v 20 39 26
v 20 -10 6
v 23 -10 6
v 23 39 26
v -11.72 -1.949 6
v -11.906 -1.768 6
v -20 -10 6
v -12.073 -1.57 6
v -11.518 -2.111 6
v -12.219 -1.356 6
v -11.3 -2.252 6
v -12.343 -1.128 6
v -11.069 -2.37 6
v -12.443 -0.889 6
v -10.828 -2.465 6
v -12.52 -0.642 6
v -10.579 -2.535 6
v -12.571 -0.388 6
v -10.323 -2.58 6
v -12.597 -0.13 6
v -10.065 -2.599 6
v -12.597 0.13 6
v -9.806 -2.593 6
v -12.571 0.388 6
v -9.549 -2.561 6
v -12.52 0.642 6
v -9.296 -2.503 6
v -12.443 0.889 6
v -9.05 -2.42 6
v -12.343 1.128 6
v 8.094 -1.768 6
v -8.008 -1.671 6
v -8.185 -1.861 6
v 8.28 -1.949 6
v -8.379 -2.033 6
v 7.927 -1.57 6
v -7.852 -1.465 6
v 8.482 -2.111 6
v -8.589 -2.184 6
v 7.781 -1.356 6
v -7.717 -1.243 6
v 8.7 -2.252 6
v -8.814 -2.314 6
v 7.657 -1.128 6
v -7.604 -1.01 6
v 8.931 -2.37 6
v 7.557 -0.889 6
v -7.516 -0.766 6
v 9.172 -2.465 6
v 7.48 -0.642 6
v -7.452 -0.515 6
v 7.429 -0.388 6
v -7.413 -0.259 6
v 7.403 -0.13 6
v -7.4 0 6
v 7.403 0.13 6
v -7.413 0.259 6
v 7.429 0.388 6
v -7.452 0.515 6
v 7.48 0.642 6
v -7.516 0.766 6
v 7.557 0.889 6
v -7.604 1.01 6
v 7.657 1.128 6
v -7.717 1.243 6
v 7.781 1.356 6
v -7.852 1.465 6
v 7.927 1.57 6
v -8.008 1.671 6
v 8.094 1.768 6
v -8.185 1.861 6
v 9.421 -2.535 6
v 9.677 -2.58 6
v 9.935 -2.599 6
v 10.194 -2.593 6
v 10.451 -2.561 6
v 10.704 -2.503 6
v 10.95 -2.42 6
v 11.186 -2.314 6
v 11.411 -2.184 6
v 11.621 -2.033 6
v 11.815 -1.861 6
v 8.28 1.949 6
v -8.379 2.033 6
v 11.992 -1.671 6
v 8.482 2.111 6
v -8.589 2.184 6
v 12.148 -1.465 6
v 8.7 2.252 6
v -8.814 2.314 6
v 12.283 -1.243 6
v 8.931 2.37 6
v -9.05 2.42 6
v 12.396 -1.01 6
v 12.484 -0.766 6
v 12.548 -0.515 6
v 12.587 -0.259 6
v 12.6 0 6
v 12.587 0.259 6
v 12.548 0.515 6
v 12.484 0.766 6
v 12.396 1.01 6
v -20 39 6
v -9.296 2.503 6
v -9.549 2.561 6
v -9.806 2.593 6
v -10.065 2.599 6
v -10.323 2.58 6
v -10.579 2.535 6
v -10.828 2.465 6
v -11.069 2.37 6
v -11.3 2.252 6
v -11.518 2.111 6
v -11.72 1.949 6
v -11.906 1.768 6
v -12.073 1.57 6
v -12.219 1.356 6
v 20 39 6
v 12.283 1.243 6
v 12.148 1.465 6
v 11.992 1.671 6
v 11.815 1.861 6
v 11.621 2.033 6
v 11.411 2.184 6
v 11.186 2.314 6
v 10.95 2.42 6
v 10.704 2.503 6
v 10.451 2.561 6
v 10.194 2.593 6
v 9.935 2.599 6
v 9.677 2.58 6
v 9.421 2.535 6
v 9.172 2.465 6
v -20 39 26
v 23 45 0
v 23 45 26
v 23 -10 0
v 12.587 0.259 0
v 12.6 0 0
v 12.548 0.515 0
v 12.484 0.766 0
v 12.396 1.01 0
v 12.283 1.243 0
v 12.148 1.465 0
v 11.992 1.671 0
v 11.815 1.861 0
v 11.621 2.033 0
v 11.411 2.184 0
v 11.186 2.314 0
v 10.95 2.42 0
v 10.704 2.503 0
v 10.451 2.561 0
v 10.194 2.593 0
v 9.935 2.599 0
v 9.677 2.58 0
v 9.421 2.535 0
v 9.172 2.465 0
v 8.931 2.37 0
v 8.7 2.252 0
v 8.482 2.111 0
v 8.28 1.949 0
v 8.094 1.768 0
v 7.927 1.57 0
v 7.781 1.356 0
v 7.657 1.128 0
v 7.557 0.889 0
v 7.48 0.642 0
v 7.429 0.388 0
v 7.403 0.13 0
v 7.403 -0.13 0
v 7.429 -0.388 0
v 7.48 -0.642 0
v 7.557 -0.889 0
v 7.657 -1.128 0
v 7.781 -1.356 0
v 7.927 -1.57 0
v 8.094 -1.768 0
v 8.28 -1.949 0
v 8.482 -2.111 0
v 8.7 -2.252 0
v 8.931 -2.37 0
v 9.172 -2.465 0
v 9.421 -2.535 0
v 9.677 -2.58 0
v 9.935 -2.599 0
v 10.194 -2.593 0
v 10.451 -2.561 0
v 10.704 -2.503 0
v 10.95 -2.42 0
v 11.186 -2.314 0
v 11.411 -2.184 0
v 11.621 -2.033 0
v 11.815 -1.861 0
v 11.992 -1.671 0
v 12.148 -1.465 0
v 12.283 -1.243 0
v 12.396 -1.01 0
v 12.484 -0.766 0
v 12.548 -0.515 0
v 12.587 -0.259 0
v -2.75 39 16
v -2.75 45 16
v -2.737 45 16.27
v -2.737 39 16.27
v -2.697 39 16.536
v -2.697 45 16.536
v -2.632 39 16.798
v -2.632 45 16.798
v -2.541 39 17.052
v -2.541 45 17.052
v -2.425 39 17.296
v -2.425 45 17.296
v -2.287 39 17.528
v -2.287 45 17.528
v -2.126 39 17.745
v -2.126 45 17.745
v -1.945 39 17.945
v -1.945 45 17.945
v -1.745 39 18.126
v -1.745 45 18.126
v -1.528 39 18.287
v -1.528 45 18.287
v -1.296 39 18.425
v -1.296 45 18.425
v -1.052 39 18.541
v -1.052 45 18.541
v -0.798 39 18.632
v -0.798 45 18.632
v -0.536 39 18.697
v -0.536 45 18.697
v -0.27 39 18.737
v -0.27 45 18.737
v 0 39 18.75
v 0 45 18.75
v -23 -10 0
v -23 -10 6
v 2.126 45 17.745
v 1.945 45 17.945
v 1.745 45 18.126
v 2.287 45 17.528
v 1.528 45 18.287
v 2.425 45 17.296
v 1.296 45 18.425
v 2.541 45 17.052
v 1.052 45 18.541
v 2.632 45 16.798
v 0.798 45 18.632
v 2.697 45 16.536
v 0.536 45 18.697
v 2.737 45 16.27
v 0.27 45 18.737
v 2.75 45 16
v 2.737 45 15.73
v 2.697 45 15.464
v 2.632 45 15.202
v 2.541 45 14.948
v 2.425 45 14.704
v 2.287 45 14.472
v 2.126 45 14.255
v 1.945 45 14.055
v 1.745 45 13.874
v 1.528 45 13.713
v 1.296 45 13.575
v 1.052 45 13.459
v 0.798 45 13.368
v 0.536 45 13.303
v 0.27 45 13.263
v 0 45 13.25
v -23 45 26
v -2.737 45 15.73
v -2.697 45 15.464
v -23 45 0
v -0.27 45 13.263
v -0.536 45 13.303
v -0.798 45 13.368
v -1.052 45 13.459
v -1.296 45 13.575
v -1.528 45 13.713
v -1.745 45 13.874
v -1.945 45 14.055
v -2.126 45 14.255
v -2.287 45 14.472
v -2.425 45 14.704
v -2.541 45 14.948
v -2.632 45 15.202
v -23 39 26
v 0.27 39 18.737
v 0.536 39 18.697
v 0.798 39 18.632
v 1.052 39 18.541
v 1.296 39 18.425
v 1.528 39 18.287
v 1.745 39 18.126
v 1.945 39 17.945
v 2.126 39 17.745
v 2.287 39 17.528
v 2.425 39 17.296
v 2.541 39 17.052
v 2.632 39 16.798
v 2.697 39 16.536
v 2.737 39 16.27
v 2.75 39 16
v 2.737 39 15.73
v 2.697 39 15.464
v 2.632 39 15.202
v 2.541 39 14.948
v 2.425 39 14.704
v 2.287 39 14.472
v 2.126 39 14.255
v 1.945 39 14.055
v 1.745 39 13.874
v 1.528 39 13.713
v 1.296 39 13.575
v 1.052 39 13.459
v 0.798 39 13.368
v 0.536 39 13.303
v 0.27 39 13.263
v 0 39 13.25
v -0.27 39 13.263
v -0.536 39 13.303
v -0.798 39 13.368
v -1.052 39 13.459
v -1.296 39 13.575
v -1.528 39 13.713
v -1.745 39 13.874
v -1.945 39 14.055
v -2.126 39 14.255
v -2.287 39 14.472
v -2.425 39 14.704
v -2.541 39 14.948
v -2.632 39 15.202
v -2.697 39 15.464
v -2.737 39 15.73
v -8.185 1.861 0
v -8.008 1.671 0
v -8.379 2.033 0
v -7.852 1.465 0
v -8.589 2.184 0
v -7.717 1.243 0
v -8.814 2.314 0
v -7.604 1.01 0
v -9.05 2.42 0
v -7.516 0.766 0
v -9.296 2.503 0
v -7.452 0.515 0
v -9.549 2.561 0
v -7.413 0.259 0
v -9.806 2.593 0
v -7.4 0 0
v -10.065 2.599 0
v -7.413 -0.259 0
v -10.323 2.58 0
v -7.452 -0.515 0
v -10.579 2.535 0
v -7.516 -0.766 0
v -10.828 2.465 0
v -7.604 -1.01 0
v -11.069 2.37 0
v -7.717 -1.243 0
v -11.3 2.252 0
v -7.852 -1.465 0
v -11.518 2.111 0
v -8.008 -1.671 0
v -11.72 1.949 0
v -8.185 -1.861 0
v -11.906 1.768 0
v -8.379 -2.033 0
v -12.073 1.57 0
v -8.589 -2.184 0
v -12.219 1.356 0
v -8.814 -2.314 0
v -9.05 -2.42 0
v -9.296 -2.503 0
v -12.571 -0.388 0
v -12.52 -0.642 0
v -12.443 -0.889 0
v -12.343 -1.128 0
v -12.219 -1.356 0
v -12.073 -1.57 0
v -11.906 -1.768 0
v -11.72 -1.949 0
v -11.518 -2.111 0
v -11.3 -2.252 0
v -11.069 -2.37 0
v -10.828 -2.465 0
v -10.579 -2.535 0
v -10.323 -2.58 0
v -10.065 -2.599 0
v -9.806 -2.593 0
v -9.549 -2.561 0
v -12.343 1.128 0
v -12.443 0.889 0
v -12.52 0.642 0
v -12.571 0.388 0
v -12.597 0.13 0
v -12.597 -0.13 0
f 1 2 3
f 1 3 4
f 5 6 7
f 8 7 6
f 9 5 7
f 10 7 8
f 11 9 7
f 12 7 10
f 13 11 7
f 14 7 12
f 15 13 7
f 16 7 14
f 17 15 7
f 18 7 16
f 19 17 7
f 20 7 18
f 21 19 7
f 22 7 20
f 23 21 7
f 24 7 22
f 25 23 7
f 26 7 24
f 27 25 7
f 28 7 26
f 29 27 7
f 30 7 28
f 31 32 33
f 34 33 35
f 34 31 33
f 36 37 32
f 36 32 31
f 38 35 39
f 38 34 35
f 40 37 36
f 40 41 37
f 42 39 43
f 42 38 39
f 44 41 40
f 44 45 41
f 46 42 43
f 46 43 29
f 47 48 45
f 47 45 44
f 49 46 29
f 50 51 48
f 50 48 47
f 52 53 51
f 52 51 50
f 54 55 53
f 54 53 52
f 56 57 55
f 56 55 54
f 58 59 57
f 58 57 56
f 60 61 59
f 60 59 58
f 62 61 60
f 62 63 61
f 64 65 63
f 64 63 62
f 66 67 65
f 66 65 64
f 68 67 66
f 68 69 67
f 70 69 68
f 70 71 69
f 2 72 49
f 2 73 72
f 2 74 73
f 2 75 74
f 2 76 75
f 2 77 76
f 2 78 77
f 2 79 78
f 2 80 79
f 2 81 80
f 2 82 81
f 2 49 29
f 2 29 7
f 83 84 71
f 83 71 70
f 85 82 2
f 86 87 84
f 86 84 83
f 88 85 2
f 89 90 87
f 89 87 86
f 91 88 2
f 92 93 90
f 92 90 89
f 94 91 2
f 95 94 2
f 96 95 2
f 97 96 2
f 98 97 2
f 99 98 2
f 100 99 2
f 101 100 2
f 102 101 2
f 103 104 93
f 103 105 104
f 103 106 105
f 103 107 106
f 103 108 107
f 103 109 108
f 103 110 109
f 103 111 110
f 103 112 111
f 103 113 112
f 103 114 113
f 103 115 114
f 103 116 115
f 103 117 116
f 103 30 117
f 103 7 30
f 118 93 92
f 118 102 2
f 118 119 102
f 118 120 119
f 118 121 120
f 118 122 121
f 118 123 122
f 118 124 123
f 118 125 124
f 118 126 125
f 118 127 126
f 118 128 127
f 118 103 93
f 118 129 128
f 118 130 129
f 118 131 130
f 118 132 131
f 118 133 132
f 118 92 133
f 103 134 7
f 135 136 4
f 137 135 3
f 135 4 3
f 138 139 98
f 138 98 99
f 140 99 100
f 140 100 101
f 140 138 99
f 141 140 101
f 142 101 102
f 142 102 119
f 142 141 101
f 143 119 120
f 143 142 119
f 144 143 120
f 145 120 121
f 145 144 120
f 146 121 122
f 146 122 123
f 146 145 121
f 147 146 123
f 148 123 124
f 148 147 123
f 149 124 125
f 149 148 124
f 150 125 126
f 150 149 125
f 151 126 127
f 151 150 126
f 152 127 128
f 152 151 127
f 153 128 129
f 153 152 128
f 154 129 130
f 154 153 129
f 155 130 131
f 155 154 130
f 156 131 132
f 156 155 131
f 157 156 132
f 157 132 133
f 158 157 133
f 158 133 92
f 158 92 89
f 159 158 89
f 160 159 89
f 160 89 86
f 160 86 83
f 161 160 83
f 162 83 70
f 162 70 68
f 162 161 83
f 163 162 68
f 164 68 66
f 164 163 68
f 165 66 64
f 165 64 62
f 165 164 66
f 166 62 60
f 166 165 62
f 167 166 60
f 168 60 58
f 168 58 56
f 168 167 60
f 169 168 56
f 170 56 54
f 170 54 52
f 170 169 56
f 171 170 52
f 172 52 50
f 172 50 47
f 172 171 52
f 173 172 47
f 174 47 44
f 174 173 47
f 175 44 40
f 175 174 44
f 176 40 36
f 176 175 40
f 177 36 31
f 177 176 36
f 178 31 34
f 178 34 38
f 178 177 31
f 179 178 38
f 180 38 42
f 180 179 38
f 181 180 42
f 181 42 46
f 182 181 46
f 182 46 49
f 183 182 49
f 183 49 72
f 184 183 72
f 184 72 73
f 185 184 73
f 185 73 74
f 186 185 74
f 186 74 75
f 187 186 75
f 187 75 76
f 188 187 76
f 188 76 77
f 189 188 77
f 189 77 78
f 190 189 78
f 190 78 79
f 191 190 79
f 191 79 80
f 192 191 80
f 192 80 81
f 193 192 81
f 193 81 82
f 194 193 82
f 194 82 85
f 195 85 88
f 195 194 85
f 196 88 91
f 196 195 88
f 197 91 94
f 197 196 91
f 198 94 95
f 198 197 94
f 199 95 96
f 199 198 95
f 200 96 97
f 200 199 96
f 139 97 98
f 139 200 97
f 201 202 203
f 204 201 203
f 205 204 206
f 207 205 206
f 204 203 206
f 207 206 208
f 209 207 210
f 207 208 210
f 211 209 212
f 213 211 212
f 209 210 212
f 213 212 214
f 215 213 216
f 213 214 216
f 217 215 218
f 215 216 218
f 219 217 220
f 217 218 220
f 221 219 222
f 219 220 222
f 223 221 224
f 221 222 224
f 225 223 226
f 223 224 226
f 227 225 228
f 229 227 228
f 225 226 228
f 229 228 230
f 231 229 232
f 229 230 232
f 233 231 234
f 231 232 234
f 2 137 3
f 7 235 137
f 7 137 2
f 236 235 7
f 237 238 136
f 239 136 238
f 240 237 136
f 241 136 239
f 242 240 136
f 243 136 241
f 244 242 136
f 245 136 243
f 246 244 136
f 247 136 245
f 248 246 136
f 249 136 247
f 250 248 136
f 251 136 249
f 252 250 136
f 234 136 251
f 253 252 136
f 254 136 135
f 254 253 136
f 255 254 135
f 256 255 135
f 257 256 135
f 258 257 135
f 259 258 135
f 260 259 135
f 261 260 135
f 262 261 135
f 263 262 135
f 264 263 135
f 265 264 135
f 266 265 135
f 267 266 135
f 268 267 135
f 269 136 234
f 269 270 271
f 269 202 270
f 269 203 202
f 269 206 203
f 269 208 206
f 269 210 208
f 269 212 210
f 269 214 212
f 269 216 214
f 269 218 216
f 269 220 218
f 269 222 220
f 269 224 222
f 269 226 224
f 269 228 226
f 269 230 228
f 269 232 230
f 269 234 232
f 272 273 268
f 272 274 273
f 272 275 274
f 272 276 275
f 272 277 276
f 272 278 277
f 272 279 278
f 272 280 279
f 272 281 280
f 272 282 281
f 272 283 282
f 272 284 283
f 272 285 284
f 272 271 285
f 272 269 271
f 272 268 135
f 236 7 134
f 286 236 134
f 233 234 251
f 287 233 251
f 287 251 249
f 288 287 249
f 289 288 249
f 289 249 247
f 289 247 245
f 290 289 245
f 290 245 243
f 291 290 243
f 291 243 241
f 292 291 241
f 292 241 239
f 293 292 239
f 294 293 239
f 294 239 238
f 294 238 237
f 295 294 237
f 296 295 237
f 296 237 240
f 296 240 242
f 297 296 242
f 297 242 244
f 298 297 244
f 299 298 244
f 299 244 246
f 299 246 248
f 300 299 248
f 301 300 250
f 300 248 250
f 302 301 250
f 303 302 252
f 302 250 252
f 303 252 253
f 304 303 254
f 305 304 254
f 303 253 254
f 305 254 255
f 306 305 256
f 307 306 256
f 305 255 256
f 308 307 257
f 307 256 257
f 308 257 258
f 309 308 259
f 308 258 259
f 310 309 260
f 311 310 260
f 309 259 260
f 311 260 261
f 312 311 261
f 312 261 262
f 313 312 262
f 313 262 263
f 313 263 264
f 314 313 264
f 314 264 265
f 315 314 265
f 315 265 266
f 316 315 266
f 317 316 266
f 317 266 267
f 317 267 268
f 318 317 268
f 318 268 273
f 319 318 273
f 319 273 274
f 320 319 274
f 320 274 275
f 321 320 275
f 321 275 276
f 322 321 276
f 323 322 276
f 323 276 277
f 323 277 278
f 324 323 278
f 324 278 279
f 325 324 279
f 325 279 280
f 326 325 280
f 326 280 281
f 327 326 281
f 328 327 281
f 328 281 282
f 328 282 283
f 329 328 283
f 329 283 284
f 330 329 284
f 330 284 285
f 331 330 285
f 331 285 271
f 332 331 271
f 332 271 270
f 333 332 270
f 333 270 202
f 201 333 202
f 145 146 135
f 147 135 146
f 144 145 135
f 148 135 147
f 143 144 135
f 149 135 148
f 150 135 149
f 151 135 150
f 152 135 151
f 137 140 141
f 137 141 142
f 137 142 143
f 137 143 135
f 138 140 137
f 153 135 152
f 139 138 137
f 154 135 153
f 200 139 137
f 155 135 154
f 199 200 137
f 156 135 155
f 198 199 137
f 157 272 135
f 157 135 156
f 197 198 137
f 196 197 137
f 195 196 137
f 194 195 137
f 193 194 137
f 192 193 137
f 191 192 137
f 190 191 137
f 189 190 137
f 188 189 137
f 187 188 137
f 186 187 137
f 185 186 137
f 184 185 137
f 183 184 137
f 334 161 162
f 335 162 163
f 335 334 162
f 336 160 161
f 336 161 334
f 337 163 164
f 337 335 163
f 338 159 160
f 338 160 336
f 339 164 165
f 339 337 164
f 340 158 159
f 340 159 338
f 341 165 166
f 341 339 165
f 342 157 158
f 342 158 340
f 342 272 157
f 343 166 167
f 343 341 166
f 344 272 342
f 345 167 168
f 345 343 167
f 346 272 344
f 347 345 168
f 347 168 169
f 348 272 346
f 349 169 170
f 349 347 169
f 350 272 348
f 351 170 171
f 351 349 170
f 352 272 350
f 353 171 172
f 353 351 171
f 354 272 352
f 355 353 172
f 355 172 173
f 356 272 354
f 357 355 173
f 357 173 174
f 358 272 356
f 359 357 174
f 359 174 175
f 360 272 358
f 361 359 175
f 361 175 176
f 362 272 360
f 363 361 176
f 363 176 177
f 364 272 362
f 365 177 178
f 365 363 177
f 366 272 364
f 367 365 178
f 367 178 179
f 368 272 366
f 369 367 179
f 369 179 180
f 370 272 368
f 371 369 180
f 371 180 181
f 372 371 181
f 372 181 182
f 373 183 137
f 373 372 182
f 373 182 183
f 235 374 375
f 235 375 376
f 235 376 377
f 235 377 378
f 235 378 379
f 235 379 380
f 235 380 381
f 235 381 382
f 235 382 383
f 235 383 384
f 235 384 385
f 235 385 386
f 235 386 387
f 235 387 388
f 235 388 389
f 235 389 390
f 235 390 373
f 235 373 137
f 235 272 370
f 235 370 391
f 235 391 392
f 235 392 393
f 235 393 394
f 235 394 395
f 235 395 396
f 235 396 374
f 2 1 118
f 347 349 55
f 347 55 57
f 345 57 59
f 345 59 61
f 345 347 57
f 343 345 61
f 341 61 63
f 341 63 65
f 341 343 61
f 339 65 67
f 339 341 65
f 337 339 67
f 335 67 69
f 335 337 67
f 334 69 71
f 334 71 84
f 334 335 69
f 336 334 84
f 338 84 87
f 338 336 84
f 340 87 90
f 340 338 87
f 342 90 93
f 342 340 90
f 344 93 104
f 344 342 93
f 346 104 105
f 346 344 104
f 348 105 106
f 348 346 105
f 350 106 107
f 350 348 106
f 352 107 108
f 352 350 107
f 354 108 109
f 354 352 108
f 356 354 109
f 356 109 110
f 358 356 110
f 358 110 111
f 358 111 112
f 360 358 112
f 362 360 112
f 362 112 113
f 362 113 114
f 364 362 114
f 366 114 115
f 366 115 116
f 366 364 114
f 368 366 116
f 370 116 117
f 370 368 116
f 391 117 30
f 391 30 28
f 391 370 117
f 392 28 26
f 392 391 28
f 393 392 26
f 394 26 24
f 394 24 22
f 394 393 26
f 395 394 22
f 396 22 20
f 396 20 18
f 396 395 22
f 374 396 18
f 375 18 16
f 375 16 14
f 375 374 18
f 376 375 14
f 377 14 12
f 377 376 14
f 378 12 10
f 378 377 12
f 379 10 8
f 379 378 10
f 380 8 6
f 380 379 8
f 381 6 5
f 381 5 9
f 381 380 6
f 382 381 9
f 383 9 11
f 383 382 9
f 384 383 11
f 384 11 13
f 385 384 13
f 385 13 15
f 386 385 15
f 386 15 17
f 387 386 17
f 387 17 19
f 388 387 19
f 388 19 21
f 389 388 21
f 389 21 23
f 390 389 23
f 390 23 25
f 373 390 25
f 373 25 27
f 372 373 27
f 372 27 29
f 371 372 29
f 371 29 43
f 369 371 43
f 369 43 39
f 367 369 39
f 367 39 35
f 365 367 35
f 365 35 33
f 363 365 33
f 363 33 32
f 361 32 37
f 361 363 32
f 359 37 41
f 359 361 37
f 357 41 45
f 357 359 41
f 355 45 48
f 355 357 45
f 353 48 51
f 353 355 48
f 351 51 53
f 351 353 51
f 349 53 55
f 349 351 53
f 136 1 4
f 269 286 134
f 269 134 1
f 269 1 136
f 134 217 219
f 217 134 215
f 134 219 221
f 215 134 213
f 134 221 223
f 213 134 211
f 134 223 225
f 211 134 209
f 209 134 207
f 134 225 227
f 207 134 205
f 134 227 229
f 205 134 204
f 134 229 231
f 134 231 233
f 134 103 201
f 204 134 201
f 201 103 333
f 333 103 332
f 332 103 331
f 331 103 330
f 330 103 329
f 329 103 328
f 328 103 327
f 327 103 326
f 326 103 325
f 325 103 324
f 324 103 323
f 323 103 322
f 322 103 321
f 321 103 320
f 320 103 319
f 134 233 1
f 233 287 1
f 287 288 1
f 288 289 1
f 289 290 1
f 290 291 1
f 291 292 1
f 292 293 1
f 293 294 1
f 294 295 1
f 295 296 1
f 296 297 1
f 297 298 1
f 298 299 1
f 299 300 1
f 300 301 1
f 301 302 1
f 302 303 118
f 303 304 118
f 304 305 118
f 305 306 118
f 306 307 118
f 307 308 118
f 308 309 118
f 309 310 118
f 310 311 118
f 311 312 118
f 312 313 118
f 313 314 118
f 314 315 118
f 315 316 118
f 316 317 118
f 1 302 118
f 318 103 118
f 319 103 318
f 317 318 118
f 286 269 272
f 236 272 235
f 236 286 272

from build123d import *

# Parameters (mm, degrees)
F0_W     = 40
F0_H     = 20
F0_R     = 2.6
F0_H_2   = 29
F1_DEPTH = 6
F0_H_3   = 6
F2_DEPTH = 26
F4_DEPTH = 3
F6_DEPTH = 25


# Not quite as in the source:
# - a pattern or mirror of a feature is missing from the dataset's text; its kind, count and spacing are read off the source's solid


with BuildPart() as f1:
    # F0 (on Top) → F1 (new body)
    with BuildSketch(Plane.XY):
        Rectangle(F0_W, F0_H)
        with Locations((-10, 0)):
            Circle(F0_R, mode=Mode.SUBTRACT)
        with Locations((10, 0)):
            Circle(F0_R, mode=Mode.SUBTRACT)
        with Locations((0, 24.5)):
            Rectangle(F0_W, F0_H_2)
    extrude(amount=F1_DEPTH)

    # F0 (on Top) → F2 (join)
    with BuildSketch(Plane.XY):
        with Locations((0, 42)):
            Rectangle(F0_W, F0_H_3)
    extrude(amount=F2_DEPTH)

    # F3 (on face) → F4 (join)
    with BuildSketch(Plane(origin=(-20, 0, 0), x_dir=(0, -1, 0), z_dir=(-1, 0, 0))):
        Polygon((10, 0), (10, 6), (-39, 26), (-45, 26), (-45, 0), align=None)
    f4 = extrude(amount=F4_DEPTH)

    # F4_copies: F4 across plane
    add(f4.mirror(Plane(origin=(0, 0, 0), x_dir=(0, 0, 1), z_dir=(1, 0, 0))))

    # F5 (on face) → F6 (cut)
    with BuildSketch(Plane(origin=(0, 45, 0), x_dir=(-1, 0, 0), z_dir=(0, 1, 0))):
        with BuildLine():
            ThreePointArc((0, 18.75), (-1.9445436483, 14.0554563517), (2.75, 16))
            ThreePointArc((2.75, 16), (1.9445436483, 17.9445436483), (0, 18.75))
        make_face()
    extrude(amount=-F6_DEPTH, mode=Mode.SUBTRACT)


solid = f1.part
